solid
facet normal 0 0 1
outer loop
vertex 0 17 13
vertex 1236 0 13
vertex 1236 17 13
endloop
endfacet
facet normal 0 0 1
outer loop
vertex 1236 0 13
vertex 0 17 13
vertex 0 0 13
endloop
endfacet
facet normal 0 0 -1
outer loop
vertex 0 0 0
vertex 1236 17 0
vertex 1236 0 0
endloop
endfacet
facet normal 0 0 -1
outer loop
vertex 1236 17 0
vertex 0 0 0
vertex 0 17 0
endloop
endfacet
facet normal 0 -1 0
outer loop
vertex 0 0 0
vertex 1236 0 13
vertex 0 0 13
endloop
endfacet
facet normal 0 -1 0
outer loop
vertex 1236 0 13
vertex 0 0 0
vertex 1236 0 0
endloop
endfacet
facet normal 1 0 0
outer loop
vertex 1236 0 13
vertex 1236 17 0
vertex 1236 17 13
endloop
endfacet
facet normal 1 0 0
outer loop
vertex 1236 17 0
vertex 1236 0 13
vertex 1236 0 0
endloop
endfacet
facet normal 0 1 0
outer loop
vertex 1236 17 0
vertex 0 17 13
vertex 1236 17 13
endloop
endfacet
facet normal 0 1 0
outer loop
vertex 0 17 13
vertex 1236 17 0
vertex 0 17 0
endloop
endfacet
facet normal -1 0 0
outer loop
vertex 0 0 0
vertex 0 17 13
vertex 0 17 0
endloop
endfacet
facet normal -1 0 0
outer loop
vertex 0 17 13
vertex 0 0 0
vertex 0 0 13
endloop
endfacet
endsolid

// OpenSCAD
translate([618.0, 8.5, 6.5]) color([0.025286397427288332, 0.12982285676032723, 0.3955808516982431]) cube([1236, 17, 13], center=true);
